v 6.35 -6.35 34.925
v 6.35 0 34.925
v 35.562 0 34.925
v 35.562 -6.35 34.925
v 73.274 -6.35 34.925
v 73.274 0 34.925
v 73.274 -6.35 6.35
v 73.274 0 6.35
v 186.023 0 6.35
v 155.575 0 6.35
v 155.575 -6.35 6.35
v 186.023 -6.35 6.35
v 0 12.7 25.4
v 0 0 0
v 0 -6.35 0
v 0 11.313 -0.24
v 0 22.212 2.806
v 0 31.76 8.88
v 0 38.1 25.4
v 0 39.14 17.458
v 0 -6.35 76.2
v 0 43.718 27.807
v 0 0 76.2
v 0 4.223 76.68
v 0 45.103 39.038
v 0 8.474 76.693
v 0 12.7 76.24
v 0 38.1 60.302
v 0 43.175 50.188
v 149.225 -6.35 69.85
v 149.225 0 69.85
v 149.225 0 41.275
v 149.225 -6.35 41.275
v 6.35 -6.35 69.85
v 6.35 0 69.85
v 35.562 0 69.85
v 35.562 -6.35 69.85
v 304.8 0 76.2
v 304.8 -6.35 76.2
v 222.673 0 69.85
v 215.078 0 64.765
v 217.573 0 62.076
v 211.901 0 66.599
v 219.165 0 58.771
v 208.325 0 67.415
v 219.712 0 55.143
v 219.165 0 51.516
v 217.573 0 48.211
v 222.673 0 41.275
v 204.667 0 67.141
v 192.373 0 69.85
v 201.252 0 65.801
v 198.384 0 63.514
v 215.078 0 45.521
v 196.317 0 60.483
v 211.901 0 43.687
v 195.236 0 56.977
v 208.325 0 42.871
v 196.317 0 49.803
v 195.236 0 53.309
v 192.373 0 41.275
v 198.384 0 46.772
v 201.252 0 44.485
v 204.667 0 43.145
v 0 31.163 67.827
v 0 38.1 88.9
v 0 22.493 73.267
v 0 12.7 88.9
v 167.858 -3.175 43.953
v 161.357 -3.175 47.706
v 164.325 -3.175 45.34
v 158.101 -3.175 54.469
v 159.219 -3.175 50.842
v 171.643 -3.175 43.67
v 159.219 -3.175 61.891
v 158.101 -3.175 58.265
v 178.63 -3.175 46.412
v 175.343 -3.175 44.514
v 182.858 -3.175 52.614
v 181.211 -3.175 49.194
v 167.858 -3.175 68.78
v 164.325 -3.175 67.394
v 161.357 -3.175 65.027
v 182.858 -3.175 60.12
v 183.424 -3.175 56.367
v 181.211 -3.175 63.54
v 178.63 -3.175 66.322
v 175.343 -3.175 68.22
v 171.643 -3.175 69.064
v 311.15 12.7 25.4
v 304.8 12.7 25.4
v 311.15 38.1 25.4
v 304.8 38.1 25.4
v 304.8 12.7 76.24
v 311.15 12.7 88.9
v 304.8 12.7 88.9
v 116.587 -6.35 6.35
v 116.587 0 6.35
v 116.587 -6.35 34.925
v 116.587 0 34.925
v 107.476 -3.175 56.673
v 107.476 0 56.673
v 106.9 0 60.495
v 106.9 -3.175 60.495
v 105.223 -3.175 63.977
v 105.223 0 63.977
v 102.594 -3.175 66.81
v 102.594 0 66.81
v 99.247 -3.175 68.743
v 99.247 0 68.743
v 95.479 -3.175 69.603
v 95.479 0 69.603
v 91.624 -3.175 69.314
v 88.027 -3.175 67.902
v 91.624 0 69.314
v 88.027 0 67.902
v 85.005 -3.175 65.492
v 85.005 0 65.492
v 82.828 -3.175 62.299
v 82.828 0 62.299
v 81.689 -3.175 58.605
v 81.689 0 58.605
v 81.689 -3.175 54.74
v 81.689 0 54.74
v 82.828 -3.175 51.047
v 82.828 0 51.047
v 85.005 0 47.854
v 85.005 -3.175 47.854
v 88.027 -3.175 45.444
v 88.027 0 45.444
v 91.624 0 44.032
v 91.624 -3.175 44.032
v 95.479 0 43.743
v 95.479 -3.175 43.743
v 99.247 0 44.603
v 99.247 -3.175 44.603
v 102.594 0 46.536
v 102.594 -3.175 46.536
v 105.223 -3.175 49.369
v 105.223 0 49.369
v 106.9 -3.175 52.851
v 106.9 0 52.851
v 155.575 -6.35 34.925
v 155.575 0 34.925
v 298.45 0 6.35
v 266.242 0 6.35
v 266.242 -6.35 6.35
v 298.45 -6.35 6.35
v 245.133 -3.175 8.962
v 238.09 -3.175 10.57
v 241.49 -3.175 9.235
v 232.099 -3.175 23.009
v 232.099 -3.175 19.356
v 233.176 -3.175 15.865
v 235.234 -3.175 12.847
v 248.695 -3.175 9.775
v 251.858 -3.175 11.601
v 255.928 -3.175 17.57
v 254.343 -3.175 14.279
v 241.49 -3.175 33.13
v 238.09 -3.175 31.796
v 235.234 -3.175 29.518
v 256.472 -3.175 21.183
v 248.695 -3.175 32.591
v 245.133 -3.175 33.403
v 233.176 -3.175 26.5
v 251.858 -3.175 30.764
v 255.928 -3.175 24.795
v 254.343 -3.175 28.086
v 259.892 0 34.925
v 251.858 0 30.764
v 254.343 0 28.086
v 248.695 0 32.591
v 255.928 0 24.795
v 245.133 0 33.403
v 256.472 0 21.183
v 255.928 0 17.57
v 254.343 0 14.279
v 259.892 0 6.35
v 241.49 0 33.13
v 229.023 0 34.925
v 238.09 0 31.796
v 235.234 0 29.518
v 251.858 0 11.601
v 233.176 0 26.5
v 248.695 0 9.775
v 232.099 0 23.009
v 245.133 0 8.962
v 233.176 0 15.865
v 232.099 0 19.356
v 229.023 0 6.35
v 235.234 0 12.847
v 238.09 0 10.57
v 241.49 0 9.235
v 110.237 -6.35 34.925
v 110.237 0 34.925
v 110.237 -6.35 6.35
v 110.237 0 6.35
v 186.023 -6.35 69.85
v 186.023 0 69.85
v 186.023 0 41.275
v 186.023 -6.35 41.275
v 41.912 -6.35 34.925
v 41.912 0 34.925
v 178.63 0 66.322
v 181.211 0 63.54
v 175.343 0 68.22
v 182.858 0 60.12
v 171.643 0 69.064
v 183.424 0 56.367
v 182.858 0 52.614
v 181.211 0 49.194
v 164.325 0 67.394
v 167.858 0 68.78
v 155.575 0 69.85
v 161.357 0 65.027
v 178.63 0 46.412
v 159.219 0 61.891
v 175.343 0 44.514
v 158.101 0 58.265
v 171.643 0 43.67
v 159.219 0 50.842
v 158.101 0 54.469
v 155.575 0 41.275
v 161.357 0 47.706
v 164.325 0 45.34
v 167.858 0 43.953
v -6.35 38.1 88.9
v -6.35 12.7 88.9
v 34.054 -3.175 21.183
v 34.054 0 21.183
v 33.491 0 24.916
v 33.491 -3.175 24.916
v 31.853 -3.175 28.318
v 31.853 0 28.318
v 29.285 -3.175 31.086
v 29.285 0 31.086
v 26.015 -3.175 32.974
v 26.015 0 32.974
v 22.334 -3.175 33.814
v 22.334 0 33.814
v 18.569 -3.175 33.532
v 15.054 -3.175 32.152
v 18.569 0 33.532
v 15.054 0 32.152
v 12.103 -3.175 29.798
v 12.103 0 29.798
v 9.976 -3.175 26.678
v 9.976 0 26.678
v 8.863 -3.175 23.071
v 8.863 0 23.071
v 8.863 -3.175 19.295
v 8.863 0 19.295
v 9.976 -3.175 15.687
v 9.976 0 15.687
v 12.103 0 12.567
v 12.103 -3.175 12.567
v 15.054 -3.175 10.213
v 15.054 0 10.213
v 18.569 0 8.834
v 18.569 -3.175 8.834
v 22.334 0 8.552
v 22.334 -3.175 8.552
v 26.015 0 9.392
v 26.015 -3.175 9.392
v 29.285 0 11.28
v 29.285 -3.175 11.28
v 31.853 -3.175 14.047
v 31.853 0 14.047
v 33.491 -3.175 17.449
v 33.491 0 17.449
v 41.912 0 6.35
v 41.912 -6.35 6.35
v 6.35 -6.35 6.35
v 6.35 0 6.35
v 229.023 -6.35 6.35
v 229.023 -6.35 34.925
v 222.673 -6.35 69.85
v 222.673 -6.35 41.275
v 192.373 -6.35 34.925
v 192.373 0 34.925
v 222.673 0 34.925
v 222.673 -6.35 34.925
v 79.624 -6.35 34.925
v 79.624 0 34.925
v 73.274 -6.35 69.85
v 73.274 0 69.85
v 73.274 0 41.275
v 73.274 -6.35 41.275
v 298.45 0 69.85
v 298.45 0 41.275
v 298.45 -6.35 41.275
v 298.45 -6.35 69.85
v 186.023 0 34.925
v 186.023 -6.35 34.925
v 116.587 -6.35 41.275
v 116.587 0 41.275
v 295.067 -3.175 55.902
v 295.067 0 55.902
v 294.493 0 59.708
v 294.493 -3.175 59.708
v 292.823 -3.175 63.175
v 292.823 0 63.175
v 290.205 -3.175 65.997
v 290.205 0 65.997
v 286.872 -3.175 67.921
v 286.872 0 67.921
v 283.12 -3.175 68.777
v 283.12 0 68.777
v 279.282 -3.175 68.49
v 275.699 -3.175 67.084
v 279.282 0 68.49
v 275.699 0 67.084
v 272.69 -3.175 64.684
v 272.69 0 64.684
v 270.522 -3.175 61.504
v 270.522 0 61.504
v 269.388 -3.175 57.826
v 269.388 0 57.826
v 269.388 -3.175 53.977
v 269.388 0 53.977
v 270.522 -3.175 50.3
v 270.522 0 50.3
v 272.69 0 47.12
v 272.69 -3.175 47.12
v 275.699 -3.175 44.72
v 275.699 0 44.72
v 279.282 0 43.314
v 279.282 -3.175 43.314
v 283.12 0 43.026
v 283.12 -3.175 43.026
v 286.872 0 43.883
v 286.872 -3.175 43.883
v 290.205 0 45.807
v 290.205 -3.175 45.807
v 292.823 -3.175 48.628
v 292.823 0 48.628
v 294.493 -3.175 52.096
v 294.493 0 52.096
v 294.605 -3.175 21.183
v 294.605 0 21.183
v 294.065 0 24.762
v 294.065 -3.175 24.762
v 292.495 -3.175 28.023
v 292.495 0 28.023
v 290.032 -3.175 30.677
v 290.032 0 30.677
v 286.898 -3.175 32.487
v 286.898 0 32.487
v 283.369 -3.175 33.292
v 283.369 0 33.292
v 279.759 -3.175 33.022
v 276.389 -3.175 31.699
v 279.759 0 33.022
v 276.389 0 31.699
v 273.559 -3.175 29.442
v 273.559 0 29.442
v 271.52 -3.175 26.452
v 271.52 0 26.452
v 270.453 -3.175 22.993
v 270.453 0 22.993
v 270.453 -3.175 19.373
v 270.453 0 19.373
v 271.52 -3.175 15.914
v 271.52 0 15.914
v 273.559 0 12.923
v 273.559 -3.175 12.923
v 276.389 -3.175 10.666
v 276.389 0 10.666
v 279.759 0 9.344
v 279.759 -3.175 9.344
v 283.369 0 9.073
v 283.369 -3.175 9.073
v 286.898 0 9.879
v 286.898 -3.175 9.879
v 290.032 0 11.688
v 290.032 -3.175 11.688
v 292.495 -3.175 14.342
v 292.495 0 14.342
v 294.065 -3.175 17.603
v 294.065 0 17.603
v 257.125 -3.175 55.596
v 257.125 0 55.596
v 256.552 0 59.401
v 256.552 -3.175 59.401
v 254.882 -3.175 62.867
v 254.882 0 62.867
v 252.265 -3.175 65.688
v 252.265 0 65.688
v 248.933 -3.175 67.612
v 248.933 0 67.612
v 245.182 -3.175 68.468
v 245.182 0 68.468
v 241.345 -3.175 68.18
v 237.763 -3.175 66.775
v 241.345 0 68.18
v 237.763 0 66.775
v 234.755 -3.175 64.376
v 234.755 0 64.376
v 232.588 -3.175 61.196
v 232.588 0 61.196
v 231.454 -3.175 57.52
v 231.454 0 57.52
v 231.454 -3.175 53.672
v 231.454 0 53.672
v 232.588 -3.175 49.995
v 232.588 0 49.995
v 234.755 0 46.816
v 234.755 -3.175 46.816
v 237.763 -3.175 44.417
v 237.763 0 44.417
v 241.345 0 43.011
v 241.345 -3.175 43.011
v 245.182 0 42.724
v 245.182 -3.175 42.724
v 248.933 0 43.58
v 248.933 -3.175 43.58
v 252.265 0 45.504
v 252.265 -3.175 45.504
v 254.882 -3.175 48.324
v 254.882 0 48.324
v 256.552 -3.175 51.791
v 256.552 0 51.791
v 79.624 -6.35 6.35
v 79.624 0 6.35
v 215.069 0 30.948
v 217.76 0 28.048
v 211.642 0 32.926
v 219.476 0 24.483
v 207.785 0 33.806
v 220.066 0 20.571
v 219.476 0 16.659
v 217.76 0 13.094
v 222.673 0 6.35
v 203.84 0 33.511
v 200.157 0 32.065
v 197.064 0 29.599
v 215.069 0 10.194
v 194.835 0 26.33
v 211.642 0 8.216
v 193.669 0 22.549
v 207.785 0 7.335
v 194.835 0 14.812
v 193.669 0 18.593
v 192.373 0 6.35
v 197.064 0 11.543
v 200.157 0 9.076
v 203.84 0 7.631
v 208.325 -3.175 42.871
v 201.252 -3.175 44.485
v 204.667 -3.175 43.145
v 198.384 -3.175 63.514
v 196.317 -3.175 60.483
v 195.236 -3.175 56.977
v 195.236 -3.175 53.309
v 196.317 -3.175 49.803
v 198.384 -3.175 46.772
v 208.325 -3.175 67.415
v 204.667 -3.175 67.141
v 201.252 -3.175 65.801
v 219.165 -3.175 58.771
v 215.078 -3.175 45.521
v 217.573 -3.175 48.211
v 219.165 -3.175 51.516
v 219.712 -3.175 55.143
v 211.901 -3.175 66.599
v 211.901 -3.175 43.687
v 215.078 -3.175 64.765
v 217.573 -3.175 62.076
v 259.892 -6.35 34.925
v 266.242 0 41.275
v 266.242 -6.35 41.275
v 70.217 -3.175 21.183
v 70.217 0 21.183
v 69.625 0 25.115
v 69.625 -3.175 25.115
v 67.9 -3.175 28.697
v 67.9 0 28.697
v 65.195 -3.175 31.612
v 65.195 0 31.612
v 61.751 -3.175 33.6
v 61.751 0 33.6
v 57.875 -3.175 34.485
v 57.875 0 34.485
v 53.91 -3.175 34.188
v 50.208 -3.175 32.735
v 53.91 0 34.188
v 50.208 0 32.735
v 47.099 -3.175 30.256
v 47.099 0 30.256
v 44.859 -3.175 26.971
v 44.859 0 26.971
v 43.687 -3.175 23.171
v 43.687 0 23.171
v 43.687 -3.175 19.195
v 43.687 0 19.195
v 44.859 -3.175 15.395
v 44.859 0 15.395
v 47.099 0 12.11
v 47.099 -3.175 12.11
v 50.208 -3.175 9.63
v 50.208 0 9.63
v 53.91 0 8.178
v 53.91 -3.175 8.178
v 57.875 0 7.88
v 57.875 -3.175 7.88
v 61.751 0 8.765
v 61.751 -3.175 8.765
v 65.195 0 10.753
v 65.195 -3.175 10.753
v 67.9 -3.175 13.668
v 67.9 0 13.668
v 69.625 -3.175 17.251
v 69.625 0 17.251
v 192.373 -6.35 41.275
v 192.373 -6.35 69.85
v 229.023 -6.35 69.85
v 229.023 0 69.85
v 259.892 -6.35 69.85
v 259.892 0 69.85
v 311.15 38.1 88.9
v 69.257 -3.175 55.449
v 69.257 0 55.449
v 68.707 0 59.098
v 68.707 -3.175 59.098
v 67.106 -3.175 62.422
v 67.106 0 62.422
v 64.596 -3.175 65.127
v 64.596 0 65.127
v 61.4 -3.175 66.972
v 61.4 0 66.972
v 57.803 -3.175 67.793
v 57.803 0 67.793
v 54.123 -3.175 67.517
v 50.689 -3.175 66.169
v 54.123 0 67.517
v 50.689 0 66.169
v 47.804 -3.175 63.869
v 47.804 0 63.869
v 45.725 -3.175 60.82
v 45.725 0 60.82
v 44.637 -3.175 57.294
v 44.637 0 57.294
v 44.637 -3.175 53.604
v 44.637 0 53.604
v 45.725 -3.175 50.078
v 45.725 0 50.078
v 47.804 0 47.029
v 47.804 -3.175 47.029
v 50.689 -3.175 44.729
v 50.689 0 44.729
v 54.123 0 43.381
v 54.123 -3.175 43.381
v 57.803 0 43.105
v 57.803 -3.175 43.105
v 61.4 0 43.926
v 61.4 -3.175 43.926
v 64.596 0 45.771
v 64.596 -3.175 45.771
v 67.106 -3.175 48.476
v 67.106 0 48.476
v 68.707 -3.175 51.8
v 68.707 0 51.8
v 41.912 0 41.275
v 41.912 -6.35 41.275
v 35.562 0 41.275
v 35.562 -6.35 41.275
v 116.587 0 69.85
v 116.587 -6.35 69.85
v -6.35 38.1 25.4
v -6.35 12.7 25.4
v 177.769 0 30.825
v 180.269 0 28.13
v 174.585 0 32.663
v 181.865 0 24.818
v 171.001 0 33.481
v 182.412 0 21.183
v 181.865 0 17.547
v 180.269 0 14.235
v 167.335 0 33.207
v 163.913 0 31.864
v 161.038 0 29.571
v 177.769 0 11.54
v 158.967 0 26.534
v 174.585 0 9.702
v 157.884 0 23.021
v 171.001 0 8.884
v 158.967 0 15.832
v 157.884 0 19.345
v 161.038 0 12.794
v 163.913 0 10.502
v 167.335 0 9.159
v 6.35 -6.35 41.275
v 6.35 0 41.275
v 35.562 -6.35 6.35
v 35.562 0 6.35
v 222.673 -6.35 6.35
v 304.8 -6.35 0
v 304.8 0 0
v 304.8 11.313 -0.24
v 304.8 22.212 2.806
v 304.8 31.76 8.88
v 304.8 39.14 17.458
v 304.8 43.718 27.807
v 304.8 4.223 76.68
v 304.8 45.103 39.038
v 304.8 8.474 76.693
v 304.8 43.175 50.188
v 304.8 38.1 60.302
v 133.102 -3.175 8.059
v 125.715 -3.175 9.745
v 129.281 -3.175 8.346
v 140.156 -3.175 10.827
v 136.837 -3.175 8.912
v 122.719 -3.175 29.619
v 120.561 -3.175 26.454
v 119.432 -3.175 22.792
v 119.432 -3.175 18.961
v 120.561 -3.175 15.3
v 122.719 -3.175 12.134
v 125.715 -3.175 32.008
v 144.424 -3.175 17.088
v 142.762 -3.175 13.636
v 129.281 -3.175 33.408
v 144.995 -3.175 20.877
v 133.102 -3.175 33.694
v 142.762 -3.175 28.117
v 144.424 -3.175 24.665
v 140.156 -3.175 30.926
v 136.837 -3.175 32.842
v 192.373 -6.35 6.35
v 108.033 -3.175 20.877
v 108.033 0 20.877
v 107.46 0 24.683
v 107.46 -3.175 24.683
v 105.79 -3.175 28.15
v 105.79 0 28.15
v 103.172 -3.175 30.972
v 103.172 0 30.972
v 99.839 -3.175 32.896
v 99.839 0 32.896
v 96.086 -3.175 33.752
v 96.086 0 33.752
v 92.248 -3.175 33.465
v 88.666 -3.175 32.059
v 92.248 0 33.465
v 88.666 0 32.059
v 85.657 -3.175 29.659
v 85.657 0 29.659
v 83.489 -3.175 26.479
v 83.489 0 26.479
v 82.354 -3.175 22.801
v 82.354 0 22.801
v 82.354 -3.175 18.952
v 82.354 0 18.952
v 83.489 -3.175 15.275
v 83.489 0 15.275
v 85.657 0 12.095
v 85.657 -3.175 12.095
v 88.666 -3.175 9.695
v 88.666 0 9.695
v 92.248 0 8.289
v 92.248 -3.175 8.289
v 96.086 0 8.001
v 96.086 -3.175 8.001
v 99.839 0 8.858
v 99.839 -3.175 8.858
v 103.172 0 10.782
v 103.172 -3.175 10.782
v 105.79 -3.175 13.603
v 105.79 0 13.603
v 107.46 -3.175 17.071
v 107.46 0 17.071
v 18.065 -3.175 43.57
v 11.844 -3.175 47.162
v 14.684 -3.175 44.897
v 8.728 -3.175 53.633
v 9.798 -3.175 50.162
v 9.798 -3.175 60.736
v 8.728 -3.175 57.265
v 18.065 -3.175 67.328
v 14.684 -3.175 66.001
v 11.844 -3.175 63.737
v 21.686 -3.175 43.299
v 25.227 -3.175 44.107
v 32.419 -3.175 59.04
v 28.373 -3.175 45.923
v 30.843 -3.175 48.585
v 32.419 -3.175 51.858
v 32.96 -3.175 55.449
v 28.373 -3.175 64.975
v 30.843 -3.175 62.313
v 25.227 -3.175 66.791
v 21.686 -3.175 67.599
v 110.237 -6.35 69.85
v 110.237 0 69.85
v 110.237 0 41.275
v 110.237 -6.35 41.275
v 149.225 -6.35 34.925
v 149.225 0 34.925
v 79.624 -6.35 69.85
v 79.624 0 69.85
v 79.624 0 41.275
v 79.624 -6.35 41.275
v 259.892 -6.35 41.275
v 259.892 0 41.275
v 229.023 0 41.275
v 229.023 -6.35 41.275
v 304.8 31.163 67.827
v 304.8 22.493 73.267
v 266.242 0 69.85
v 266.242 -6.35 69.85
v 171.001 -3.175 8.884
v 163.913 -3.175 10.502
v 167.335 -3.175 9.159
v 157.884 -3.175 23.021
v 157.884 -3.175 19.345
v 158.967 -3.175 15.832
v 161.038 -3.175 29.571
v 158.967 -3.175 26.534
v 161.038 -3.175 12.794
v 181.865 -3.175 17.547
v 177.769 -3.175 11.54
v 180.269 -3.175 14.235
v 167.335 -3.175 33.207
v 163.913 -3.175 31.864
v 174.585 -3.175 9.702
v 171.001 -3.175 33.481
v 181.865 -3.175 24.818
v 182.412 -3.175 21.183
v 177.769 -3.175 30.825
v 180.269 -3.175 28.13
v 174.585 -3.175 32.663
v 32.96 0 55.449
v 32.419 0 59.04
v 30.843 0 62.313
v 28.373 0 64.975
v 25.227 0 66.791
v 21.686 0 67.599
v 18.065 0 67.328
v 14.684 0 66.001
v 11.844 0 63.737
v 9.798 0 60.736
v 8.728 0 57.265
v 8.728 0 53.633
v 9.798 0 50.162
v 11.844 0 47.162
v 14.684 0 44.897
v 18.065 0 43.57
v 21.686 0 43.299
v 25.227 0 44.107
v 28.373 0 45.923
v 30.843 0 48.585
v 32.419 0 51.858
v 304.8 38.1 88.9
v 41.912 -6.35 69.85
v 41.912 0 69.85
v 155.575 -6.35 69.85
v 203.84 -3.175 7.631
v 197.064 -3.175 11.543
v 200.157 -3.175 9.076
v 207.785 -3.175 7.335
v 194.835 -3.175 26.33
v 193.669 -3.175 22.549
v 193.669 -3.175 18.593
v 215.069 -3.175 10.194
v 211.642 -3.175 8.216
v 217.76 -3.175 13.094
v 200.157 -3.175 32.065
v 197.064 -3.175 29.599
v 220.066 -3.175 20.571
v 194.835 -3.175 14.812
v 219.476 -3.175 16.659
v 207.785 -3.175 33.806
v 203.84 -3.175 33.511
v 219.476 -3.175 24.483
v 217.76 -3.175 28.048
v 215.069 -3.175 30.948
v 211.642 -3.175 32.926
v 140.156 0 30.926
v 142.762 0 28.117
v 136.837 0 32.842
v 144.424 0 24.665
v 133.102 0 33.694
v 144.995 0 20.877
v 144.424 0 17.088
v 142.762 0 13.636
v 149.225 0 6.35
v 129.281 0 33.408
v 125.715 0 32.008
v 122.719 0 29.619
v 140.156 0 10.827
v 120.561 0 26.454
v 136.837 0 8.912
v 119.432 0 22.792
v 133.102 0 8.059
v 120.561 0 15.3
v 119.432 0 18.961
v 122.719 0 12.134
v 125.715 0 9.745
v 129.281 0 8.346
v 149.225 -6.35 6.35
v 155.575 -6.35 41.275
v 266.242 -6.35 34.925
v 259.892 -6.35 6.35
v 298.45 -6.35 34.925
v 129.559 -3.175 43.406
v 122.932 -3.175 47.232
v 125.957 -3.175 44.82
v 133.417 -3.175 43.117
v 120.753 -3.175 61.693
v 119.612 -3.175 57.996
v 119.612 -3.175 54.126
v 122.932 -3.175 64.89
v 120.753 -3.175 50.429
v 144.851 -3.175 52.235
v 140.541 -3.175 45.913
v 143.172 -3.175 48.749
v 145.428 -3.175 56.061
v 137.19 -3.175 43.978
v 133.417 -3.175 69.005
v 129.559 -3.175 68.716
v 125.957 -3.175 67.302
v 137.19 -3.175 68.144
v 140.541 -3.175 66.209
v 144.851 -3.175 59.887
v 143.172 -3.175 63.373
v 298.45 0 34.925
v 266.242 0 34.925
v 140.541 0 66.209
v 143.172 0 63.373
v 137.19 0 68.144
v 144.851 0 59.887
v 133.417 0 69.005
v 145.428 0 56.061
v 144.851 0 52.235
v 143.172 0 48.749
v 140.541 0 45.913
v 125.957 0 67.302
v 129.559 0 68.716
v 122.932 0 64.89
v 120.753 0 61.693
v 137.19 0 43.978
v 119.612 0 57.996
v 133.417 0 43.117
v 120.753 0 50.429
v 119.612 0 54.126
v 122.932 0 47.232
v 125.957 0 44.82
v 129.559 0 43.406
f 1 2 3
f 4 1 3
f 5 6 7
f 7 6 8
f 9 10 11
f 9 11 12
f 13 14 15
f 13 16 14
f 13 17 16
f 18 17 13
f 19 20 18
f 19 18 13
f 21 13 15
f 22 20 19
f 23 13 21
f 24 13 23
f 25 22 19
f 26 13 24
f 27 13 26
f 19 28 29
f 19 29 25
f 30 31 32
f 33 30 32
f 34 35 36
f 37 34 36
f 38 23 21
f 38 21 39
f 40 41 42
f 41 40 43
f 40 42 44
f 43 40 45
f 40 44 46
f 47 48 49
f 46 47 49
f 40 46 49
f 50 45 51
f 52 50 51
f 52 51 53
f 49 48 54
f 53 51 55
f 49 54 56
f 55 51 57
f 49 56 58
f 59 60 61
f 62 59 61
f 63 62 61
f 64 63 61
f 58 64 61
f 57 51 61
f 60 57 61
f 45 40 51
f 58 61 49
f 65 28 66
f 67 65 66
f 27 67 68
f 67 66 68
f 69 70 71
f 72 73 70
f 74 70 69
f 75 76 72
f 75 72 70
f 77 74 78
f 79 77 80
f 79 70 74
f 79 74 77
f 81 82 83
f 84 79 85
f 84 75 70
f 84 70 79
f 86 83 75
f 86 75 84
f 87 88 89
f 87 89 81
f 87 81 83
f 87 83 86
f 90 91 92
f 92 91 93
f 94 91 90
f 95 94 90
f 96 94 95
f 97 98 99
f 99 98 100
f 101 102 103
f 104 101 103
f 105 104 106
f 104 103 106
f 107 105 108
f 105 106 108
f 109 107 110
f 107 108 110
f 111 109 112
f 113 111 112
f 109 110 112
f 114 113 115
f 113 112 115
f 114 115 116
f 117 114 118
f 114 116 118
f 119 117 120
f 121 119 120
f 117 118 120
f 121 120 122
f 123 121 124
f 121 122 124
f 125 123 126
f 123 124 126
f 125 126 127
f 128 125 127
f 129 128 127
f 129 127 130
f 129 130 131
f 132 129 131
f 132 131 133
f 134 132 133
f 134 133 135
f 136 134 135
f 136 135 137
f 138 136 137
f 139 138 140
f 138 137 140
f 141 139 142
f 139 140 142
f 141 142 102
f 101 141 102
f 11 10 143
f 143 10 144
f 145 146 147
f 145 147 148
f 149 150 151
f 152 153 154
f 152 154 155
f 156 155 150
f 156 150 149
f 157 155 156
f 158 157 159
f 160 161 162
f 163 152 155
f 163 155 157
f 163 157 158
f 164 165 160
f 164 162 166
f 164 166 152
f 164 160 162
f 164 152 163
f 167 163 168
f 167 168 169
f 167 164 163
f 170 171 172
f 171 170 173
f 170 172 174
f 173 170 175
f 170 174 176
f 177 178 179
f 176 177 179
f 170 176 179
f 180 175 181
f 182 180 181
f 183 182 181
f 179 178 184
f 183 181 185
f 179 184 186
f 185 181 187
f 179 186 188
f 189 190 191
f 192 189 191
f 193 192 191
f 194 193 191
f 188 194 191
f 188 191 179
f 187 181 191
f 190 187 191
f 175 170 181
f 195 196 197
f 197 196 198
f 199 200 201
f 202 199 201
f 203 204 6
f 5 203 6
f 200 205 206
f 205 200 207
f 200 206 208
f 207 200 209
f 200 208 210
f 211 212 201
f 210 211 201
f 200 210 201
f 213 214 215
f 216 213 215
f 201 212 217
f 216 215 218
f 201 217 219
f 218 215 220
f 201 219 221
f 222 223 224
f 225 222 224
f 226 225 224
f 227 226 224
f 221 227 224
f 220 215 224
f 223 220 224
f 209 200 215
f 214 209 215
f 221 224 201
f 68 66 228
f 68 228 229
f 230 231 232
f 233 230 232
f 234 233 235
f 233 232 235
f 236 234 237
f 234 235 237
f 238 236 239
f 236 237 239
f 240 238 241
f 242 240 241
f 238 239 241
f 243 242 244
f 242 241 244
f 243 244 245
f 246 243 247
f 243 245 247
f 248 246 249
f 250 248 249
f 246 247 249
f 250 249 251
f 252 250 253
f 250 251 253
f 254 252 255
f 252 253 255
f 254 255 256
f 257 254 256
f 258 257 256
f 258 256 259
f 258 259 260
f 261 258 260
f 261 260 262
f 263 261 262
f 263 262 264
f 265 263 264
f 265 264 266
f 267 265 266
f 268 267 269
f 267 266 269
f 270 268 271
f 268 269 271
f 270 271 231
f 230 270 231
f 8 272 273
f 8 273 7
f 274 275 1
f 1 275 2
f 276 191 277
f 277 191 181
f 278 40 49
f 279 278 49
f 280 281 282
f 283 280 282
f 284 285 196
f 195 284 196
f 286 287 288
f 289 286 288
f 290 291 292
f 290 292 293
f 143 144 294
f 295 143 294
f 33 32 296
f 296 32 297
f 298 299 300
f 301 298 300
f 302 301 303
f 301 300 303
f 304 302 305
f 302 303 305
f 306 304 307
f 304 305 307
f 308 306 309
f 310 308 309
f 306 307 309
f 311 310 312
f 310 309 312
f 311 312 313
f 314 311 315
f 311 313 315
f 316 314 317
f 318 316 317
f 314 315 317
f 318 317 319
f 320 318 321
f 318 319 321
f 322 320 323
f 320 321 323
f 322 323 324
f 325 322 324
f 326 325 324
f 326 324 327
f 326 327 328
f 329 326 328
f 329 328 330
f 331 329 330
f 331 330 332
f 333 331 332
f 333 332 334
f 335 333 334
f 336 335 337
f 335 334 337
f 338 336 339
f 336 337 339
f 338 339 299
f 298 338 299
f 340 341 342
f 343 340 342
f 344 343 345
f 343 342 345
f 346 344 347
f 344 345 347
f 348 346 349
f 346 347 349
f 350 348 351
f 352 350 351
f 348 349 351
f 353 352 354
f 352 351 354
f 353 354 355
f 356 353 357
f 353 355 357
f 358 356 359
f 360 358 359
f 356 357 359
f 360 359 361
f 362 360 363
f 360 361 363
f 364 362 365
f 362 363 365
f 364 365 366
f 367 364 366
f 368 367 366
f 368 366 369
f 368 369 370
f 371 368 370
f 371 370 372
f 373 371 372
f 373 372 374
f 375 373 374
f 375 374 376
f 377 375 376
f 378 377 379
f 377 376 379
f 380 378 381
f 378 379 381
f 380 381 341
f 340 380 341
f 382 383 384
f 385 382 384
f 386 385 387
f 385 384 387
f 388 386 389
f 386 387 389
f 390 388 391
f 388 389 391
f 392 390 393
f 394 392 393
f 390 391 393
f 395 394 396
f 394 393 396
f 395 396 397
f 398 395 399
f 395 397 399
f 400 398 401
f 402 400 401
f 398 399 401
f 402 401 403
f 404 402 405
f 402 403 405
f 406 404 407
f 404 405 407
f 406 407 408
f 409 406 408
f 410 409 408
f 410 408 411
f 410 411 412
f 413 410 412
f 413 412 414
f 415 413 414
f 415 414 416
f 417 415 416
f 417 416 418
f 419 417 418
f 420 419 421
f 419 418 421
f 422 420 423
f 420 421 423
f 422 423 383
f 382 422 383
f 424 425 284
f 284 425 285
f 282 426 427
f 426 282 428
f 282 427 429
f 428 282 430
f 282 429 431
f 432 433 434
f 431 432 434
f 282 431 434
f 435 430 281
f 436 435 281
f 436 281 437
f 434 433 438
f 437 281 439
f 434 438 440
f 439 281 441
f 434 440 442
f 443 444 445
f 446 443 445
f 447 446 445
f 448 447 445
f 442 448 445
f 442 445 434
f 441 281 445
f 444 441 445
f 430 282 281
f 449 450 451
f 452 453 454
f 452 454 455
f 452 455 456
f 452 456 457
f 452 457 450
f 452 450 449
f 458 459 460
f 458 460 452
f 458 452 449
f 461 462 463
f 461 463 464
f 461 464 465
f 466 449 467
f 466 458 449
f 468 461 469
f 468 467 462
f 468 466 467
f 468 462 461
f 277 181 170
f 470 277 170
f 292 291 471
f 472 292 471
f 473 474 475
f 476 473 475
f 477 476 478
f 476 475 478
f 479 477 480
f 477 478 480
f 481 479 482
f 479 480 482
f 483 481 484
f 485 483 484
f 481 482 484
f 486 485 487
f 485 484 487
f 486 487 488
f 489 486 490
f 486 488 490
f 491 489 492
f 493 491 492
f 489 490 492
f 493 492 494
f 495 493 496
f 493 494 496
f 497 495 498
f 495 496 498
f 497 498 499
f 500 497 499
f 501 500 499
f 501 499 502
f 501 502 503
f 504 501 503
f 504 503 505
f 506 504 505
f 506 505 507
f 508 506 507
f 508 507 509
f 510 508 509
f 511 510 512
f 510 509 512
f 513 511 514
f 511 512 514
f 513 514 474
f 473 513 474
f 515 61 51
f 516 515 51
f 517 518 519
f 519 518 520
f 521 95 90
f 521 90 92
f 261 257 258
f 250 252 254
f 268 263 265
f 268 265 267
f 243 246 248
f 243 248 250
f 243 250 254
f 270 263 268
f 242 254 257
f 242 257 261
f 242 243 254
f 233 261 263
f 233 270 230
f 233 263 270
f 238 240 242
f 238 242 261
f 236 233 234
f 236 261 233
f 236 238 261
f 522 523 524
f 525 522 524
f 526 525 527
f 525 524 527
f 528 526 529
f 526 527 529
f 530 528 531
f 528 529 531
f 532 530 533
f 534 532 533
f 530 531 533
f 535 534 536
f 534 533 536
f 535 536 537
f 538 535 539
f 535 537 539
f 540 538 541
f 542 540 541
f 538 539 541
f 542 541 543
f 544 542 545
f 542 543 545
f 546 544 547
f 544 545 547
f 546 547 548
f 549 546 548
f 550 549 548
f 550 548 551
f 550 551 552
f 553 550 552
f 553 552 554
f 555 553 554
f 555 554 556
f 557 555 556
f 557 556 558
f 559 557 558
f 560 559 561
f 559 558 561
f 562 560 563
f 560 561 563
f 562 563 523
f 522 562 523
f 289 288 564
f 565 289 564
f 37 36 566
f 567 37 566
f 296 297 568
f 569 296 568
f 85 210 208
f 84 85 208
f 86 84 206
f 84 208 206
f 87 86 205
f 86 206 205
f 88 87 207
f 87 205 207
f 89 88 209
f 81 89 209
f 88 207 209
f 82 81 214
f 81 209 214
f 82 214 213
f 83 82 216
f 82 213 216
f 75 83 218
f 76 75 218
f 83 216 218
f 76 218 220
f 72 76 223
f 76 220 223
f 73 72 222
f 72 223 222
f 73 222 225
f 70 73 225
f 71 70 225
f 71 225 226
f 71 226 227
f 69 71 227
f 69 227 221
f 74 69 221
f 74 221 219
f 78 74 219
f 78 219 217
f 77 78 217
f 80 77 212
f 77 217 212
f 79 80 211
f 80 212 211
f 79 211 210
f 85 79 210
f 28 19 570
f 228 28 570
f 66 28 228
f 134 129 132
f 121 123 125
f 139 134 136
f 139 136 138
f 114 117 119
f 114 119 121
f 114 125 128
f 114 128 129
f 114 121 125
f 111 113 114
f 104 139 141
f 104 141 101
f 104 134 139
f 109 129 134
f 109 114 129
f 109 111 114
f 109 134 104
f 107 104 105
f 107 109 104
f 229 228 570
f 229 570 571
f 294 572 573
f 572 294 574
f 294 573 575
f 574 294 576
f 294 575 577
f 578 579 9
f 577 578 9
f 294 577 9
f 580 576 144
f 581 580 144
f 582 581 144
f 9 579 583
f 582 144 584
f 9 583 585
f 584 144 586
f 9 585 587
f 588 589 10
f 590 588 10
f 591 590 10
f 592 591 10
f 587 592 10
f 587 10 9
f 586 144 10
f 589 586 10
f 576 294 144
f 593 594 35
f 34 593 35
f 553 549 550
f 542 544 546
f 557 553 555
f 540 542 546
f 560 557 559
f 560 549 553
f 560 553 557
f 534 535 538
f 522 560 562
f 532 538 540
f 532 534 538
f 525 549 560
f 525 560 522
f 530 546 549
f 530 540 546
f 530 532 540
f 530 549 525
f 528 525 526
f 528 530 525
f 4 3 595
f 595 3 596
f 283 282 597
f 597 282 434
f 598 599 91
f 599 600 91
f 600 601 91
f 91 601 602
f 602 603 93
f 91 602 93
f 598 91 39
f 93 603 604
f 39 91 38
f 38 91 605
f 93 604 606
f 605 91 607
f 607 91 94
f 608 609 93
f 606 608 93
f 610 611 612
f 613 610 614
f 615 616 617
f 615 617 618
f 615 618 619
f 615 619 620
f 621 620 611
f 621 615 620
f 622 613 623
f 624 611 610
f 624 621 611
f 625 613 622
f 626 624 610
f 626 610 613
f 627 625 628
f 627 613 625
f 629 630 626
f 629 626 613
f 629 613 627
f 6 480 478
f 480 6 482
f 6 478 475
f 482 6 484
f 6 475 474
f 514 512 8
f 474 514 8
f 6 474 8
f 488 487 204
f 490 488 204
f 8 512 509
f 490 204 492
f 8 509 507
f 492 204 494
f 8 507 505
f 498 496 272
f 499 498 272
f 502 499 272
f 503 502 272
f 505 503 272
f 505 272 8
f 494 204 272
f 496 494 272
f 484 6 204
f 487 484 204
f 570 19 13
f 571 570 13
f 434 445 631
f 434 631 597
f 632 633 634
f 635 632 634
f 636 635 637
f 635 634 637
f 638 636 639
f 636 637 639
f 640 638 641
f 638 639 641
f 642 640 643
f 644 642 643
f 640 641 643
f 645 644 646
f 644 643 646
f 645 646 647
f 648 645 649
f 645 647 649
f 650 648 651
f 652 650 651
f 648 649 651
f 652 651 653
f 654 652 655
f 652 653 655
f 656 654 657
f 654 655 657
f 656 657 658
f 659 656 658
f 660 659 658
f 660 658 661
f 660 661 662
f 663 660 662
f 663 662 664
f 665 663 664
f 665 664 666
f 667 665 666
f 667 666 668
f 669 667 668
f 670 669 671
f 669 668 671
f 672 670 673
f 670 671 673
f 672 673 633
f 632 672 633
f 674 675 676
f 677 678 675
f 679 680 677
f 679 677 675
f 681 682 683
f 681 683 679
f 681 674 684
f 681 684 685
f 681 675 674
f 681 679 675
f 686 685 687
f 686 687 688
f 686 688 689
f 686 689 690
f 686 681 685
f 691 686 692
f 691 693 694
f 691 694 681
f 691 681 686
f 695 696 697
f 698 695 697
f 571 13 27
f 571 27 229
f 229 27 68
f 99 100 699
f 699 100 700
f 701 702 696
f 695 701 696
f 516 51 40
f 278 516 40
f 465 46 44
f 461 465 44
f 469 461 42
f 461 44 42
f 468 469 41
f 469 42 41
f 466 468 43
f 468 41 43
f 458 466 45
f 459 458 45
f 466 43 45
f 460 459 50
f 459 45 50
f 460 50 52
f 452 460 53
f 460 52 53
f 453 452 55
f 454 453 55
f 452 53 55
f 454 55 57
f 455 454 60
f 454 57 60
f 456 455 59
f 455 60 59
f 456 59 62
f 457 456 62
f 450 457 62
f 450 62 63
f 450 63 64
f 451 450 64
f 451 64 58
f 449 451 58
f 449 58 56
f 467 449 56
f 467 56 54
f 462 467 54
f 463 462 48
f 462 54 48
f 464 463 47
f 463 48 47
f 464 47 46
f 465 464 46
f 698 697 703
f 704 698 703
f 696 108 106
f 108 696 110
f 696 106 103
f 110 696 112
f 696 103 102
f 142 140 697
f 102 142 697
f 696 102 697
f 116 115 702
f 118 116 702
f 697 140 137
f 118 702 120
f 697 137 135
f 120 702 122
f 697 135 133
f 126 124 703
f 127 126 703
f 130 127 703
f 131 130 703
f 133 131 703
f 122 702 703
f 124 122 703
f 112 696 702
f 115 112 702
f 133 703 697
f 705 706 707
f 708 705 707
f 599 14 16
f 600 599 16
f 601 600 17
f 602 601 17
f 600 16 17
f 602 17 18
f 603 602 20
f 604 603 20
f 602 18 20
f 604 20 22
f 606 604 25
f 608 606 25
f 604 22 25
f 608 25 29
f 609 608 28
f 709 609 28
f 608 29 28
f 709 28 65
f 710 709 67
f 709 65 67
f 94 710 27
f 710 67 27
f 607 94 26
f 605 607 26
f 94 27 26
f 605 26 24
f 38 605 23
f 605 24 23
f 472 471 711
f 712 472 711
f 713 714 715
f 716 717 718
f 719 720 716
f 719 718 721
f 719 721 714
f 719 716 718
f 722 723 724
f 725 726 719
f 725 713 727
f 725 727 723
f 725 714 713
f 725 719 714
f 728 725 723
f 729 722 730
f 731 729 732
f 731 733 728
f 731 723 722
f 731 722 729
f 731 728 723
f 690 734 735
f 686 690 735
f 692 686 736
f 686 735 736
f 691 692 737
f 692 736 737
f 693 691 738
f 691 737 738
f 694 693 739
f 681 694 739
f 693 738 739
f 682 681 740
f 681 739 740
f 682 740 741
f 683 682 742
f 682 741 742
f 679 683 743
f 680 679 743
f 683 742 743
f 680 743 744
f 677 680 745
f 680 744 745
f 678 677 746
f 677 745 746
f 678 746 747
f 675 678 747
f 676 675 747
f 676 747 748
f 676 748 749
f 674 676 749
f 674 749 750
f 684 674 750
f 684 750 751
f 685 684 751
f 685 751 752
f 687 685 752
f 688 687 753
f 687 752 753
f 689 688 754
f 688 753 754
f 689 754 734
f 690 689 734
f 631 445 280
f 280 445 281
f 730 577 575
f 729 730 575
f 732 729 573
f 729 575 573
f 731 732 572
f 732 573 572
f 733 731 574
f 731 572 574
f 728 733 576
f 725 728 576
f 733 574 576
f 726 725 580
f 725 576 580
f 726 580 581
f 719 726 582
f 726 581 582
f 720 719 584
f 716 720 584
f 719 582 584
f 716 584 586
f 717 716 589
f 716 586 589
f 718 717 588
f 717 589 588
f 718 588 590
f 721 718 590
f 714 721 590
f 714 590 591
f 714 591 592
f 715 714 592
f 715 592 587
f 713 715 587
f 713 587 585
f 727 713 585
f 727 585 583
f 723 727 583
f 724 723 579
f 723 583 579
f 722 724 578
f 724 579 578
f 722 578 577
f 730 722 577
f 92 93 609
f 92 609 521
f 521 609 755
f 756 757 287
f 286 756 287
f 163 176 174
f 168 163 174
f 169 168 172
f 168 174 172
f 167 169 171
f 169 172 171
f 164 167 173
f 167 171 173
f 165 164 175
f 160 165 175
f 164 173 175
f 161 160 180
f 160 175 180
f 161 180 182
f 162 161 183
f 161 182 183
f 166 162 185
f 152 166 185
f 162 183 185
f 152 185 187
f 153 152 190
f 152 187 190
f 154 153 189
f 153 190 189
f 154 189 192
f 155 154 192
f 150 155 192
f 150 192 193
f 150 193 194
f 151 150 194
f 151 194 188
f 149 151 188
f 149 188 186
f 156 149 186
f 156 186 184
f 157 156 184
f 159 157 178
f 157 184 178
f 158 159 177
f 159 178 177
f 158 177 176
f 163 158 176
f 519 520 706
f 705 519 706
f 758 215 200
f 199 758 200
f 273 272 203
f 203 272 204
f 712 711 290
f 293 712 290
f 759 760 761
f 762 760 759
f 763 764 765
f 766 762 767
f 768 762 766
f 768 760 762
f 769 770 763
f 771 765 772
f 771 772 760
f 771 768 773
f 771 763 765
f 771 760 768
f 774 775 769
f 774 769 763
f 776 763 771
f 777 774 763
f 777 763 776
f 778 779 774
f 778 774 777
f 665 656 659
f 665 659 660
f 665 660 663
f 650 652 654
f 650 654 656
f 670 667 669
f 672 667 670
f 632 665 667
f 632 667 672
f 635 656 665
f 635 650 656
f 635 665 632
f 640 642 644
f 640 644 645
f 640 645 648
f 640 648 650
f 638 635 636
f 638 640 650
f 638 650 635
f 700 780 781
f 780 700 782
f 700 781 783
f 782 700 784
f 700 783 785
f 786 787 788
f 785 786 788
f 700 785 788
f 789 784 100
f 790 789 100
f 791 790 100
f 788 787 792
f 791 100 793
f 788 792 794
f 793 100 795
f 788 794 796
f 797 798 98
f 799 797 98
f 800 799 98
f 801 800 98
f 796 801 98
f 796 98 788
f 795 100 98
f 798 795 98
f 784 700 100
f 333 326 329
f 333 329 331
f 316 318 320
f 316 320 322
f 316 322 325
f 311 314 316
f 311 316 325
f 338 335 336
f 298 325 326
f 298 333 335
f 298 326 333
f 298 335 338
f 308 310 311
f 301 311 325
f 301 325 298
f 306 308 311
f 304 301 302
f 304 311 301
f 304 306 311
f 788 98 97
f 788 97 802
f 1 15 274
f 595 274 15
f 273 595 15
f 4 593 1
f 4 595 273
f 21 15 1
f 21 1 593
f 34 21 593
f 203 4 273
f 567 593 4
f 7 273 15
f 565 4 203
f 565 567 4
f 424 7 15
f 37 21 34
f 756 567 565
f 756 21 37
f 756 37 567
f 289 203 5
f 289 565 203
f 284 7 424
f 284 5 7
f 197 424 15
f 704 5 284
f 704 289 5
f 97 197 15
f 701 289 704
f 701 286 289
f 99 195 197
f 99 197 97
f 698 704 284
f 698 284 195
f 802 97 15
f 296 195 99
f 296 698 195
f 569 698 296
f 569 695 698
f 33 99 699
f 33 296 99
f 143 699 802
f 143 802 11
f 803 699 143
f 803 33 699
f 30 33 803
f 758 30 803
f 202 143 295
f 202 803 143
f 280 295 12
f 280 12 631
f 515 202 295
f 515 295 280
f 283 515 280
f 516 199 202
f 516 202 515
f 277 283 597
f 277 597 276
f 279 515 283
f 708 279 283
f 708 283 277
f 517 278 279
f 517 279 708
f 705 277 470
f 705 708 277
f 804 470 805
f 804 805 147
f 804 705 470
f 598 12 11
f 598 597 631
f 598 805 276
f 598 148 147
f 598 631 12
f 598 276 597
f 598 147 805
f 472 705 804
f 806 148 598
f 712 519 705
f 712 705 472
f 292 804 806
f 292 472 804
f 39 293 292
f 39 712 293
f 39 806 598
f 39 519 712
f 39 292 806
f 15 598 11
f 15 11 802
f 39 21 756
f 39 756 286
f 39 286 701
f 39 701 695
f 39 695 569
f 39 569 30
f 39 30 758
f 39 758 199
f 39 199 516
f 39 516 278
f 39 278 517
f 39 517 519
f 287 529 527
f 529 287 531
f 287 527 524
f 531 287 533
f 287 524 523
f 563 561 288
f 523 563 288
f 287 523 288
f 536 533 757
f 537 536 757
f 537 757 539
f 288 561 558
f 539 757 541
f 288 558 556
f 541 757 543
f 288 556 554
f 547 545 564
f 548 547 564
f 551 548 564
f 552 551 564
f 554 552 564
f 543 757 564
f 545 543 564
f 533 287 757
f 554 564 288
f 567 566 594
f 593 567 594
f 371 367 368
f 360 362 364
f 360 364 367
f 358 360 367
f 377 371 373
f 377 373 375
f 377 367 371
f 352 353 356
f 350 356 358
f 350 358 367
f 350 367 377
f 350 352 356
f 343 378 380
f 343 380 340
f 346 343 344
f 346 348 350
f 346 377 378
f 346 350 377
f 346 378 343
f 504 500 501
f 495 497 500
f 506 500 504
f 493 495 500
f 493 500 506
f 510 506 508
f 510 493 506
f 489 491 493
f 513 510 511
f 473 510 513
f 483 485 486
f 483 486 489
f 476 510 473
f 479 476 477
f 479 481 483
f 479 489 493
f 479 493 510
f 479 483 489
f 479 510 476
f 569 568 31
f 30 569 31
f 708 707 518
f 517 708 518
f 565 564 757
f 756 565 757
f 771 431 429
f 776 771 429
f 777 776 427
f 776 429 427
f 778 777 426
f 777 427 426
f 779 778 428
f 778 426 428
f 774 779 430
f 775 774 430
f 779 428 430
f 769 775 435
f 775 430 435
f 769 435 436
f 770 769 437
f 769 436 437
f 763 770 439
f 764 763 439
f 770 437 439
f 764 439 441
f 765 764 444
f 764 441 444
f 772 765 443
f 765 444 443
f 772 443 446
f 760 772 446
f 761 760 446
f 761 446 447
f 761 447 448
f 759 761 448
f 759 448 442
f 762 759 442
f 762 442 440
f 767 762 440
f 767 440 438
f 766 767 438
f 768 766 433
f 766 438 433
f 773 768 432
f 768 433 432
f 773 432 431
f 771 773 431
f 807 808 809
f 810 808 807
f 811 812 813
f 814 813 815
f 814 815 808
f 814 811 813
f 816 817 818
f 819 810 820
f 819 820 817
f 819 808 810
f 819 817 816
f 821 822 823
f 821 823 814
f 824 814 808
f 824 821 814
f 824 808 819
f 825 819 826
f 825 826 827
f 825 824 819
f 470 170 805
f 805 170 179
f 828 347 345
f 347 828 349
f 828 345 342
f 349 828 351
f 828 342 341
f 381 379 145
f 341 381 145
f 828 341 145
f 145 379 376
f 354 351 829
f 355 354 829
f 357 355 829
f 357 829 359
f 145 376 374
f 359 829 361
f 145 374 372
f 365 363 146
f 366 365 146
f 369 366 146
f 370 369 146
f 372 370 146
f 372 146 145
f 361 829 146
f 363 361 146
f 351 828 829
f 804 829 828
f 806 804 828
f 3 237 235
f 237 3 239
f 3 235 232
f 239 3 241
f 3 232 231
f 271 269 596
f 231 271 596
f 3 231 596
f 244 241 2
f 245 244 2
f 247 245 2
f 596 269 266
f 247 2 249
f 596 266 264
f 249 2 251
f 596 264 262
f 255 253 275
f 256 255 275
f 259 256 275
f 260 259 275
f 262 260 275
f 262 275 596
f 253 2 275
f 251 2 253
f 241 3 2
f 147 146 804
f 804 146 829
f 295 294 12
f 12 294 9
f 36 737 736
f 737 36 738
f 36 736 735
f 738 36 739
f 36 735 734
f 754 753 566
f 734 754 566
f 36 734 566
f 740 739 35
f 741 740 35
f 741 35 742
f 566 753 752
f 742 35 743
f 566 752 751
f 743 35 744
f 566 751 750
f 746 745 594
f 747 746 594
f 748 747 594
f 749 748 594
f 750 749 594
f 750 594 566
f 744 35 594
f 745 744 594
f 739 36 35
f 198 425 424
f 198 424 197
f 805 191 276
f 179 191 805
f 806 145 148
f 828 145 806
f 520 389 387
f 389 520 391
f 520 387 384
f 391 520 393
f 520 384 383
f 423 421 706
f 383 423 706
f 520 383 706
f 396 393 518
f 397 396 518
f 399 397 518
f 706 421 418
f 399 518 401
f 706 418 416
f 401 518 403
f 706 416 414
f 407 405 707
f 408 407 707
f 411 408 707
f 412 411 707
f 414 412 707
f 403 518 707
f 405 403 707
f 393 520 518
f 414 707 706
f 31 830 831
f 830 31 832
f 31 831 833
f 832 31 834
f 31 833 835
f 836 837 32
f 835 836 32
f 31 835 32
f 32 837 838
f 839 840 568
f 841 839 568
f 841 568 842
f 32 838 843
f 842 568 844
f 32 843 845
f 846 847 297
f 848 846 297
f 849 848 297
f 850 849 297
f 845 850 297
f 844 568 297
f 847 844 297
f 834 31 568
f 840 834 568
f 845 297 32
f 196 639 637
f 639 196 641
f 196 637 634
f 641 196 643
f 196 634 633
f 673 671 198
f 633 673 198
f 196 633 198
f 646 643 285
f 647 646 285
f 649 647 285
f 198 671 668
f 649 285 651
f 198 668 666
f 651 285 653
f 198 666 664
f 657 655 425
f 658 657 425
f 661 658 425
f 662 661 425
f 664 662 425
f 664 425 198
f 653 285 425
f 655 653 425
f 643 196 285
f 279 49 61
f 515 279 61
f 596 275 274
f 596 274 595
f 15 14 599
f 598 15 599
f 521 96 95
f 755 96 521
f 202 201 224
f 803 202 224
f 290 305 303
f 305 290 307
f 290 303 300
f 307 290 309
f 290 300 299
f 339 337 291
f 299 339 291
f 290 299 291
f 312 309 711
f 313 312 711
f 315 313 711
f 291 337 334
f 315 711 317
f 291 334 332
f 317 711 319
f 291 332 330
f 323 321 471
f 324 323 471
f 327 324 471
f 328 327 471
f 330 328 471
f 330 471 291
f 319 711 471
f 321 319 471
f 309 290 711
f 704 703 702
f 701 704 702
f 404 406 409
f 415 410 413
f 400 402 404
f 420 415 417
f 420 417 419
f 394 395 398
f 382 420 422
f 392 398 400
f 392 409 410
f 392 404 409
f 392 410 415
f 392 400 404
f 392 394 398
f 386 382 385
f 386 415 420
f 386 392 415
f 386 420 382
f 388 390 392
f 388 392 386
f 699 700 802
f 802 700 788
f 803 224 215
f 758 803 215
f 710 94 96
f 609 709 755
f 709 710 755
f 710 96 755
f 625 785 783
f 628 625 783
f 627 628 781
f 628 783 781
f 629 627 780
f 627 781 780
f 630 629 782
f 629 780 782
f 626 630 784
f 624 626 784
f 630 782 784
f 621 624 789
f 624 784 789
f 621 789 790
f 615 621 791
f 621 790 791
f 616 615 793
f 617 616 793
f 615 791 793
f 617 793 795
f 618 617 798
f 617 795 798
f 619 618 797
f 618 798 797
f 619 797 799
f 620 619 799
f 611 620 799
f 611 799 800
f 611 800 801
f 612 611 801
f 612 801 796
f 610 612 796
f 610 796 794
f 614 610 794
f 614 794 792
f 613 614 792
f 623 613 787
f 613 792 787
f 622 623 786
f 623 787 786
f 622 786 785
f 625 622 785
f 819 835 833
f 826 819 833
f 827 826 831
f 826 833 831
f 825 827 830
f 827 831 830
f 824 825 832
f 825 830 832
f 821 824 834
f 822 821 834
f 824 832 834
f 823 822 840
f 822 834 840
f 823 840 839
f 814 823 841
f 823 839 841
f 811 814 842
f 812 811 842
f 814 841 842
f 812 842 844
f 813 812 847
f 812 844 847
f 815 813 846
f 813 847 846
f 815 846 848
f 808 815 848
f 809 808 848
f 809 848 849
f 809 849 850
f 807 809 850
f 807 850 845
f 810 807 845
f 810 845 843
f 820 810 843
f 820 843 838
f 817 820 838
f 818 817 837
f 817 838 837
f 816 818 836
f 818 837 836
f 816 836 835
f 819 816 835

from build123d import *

# Parameters (mm, degrees)
F1_DEPTH  = 304.8
F2_W      = 25.4
F2_H      = 63.5
F3_DEPTH  = 6.35
F4_W      = 25.4
F4_H      = 63.5
F5_DEPTH  = 6.35
F6_W      = 304.8
F6_H      = 76.2
F6_W_2    = 292.099996
F6_H_2    = 63.499996
F7_DEPTH  = 6.35
F9_DEPTH  = 6.35
F10_R     = 12.18433
F10_R_2   = 12.378685
F10_R_3   = 12.666462
F10_R_4   = 13.33955
F10_R_5   = 12.965917
F10_R_6   = 12.911659
F10_R_7   = 12.980347
F10_R_8   = 12.853529
F10_R_9   = 12.732802
F10_R_10  = 12.333231
F10_R_11  = 12.306635
F10_R_12  = 13.272723
F10_R_13  = 12.908035
F10_R_14  = 12.255033
F10_R_15  = 12.911662
F10_R_16  = 12.143618
F11_DEPTH = 3.175


with BuildPart() as f1:
    # F0 (on Right) → F1 (new body)
    with BuildSketch(Plane.YZ):
        with BuildLine():
            Line((0, 76.2), (0, 0))
            ThreePointArc((0, 0), (45.114366, 38.1), (0, 76.2))
        make_face()
    extrude(amount=F1_DEPTH)

    # F2 (on face) → F3 (join)
    with BuildSketch(Plane(origin=(0, 0, 0), x_dir=(0, -1, 0), z_dir=(-1, 0, 0))):
        with Locations((-25.4, 57.15)):
            Rectangle(F2_W, F2_H)
    extrude(amount=F3_DEPTH)

    # F4 (on face) → F5 (join)
    with BuildSketch(Plane.YZ.offset(304.8)):
        with Locations((25.4, 57.15)):
            Rectangle(F4_W, F4_H)
    extrude(amount=F5_DEPTH)

    # F6 (on face) → F7 (join)
    with BuildSketch(Plane.XZ):
        with Locations((152.4, 38.1)):
            Rectangle(F6_W, F6_H)
        with Locations((152.4, 38.1)):
            Rectangle(F6_W_2, F6_H_2, mode=Mode.SUBTRACT)
    extrude(amount=F7_DEPTH)

    # F8 (on face) → F9 (join)
    with BuildSketch(Plane.XZ):
        Polygon((298.449998, 34.925), (298.449998, 41.275), (266.241582, 41.275), (266.241582, 69.849998), (259.891582, 69.849998), (259.891582, 41.275), (229.023391, 41.275), (229.023391, 69.849998), (222.673391, 69.849998), (222.673391, 41.275), (192.373246, 41.275), (192.373246, 69.849998), (186.023246, 69.849998), (186.023246, 41.275), (155.575, 41.275), (155.575, 69.849998), (149.225, 69.849998), (149.225, 41.275), (116.587477, 41.275), (116.587477, 69.849998), (110.237477, 69.849998), (110.237477, 41.275), (79.624019, 41.275), (79.624019, 69.849998), (73.274019, 69.849998), (73.274019, 41.275), (41.912001, 41.275), (41.912001, 69.849998), (35.562001, 69.849998), (35.562001, 41.275), (6.350002, 41.275), (6.350002, 34.925), (35.562001, 34.925), (35.562001, 6.350002), (41.912001, 6.350002), (41.912001, 34.925), (73.274019, 34.925), (73.274019, 6.350002), (79.624019, 6.350002), (79.624019, 34.925), (110.237477, 34.925), (110.237477, 6.350002), (116.587477, 6.350002), (116.587477, 34.925), (149.225, 34.925), (149.225, 6.350002), (155.575, 6.350002), (155.575, 34.925), (186.023246, 34.925), (186.023246, 6.350002), (192.373246, 6.350002), (192.373246, 34.925), (222.673391, 34.925), (222.673391, 6.350002), (229.023391, 6.350002), (229.023391, 34.925), (259.891582, 34.925), (259.891582, 6.350002), (266.241582, 6.350002), (266.241582, 34.925), align=None)
    extrude(amount=F9_DEPTH)

    # F10 (on face) → F11 (join)
    with BuildSketch(Plane.XZ):
        with Locations((20.775795, 55.44908)):
            Circle(F10_R)
        with Locations((56.877859, 55.44908)):
            Circle(F10_R_2)
        with Locations((21.387694, 21.182716)):
            Circle(F10_R_3)
        with Locations((56.877859, 21.182716)):
            Circle(F10_R_4)
        with Locations((94.509669, 56.672879)):
            Circle(F10_R_5)
        with Locations((95.12157, 20.876767)):
            Circle(F10_R_6)
        with Locations((132.447436, 56.060981)):
            Circle(F10_R_7)
        with Locations((132.141486, 20.876767)):
            Circle(F10_R_8)
        with Locations((170.691147, 56.366932)):
            Circle(F10_R_9)
        with Locations((170.079246, 21.182716)):
            Circle(F10_R_10)
        with Locations((207.405105, 55.143133)):
            Circle(F10_R_11)
        with Locations((206.793204, 20.570816)):
            Circle(F10_R_12)
        with Locations((244.217366, 55.595852)):
            Circle(F10_R_13)
        with Locations((244.217366, 21.182716)):
            Circle(F10_R_14)
        with Locations((282.155126, 55.901799)):
            Circle(F10_R_15)
        with Locations((282.461077, 21.182716)):
            Circle(F10_R_16)
    extrude(amount=F11_DEPTH)


solid = f1.part
